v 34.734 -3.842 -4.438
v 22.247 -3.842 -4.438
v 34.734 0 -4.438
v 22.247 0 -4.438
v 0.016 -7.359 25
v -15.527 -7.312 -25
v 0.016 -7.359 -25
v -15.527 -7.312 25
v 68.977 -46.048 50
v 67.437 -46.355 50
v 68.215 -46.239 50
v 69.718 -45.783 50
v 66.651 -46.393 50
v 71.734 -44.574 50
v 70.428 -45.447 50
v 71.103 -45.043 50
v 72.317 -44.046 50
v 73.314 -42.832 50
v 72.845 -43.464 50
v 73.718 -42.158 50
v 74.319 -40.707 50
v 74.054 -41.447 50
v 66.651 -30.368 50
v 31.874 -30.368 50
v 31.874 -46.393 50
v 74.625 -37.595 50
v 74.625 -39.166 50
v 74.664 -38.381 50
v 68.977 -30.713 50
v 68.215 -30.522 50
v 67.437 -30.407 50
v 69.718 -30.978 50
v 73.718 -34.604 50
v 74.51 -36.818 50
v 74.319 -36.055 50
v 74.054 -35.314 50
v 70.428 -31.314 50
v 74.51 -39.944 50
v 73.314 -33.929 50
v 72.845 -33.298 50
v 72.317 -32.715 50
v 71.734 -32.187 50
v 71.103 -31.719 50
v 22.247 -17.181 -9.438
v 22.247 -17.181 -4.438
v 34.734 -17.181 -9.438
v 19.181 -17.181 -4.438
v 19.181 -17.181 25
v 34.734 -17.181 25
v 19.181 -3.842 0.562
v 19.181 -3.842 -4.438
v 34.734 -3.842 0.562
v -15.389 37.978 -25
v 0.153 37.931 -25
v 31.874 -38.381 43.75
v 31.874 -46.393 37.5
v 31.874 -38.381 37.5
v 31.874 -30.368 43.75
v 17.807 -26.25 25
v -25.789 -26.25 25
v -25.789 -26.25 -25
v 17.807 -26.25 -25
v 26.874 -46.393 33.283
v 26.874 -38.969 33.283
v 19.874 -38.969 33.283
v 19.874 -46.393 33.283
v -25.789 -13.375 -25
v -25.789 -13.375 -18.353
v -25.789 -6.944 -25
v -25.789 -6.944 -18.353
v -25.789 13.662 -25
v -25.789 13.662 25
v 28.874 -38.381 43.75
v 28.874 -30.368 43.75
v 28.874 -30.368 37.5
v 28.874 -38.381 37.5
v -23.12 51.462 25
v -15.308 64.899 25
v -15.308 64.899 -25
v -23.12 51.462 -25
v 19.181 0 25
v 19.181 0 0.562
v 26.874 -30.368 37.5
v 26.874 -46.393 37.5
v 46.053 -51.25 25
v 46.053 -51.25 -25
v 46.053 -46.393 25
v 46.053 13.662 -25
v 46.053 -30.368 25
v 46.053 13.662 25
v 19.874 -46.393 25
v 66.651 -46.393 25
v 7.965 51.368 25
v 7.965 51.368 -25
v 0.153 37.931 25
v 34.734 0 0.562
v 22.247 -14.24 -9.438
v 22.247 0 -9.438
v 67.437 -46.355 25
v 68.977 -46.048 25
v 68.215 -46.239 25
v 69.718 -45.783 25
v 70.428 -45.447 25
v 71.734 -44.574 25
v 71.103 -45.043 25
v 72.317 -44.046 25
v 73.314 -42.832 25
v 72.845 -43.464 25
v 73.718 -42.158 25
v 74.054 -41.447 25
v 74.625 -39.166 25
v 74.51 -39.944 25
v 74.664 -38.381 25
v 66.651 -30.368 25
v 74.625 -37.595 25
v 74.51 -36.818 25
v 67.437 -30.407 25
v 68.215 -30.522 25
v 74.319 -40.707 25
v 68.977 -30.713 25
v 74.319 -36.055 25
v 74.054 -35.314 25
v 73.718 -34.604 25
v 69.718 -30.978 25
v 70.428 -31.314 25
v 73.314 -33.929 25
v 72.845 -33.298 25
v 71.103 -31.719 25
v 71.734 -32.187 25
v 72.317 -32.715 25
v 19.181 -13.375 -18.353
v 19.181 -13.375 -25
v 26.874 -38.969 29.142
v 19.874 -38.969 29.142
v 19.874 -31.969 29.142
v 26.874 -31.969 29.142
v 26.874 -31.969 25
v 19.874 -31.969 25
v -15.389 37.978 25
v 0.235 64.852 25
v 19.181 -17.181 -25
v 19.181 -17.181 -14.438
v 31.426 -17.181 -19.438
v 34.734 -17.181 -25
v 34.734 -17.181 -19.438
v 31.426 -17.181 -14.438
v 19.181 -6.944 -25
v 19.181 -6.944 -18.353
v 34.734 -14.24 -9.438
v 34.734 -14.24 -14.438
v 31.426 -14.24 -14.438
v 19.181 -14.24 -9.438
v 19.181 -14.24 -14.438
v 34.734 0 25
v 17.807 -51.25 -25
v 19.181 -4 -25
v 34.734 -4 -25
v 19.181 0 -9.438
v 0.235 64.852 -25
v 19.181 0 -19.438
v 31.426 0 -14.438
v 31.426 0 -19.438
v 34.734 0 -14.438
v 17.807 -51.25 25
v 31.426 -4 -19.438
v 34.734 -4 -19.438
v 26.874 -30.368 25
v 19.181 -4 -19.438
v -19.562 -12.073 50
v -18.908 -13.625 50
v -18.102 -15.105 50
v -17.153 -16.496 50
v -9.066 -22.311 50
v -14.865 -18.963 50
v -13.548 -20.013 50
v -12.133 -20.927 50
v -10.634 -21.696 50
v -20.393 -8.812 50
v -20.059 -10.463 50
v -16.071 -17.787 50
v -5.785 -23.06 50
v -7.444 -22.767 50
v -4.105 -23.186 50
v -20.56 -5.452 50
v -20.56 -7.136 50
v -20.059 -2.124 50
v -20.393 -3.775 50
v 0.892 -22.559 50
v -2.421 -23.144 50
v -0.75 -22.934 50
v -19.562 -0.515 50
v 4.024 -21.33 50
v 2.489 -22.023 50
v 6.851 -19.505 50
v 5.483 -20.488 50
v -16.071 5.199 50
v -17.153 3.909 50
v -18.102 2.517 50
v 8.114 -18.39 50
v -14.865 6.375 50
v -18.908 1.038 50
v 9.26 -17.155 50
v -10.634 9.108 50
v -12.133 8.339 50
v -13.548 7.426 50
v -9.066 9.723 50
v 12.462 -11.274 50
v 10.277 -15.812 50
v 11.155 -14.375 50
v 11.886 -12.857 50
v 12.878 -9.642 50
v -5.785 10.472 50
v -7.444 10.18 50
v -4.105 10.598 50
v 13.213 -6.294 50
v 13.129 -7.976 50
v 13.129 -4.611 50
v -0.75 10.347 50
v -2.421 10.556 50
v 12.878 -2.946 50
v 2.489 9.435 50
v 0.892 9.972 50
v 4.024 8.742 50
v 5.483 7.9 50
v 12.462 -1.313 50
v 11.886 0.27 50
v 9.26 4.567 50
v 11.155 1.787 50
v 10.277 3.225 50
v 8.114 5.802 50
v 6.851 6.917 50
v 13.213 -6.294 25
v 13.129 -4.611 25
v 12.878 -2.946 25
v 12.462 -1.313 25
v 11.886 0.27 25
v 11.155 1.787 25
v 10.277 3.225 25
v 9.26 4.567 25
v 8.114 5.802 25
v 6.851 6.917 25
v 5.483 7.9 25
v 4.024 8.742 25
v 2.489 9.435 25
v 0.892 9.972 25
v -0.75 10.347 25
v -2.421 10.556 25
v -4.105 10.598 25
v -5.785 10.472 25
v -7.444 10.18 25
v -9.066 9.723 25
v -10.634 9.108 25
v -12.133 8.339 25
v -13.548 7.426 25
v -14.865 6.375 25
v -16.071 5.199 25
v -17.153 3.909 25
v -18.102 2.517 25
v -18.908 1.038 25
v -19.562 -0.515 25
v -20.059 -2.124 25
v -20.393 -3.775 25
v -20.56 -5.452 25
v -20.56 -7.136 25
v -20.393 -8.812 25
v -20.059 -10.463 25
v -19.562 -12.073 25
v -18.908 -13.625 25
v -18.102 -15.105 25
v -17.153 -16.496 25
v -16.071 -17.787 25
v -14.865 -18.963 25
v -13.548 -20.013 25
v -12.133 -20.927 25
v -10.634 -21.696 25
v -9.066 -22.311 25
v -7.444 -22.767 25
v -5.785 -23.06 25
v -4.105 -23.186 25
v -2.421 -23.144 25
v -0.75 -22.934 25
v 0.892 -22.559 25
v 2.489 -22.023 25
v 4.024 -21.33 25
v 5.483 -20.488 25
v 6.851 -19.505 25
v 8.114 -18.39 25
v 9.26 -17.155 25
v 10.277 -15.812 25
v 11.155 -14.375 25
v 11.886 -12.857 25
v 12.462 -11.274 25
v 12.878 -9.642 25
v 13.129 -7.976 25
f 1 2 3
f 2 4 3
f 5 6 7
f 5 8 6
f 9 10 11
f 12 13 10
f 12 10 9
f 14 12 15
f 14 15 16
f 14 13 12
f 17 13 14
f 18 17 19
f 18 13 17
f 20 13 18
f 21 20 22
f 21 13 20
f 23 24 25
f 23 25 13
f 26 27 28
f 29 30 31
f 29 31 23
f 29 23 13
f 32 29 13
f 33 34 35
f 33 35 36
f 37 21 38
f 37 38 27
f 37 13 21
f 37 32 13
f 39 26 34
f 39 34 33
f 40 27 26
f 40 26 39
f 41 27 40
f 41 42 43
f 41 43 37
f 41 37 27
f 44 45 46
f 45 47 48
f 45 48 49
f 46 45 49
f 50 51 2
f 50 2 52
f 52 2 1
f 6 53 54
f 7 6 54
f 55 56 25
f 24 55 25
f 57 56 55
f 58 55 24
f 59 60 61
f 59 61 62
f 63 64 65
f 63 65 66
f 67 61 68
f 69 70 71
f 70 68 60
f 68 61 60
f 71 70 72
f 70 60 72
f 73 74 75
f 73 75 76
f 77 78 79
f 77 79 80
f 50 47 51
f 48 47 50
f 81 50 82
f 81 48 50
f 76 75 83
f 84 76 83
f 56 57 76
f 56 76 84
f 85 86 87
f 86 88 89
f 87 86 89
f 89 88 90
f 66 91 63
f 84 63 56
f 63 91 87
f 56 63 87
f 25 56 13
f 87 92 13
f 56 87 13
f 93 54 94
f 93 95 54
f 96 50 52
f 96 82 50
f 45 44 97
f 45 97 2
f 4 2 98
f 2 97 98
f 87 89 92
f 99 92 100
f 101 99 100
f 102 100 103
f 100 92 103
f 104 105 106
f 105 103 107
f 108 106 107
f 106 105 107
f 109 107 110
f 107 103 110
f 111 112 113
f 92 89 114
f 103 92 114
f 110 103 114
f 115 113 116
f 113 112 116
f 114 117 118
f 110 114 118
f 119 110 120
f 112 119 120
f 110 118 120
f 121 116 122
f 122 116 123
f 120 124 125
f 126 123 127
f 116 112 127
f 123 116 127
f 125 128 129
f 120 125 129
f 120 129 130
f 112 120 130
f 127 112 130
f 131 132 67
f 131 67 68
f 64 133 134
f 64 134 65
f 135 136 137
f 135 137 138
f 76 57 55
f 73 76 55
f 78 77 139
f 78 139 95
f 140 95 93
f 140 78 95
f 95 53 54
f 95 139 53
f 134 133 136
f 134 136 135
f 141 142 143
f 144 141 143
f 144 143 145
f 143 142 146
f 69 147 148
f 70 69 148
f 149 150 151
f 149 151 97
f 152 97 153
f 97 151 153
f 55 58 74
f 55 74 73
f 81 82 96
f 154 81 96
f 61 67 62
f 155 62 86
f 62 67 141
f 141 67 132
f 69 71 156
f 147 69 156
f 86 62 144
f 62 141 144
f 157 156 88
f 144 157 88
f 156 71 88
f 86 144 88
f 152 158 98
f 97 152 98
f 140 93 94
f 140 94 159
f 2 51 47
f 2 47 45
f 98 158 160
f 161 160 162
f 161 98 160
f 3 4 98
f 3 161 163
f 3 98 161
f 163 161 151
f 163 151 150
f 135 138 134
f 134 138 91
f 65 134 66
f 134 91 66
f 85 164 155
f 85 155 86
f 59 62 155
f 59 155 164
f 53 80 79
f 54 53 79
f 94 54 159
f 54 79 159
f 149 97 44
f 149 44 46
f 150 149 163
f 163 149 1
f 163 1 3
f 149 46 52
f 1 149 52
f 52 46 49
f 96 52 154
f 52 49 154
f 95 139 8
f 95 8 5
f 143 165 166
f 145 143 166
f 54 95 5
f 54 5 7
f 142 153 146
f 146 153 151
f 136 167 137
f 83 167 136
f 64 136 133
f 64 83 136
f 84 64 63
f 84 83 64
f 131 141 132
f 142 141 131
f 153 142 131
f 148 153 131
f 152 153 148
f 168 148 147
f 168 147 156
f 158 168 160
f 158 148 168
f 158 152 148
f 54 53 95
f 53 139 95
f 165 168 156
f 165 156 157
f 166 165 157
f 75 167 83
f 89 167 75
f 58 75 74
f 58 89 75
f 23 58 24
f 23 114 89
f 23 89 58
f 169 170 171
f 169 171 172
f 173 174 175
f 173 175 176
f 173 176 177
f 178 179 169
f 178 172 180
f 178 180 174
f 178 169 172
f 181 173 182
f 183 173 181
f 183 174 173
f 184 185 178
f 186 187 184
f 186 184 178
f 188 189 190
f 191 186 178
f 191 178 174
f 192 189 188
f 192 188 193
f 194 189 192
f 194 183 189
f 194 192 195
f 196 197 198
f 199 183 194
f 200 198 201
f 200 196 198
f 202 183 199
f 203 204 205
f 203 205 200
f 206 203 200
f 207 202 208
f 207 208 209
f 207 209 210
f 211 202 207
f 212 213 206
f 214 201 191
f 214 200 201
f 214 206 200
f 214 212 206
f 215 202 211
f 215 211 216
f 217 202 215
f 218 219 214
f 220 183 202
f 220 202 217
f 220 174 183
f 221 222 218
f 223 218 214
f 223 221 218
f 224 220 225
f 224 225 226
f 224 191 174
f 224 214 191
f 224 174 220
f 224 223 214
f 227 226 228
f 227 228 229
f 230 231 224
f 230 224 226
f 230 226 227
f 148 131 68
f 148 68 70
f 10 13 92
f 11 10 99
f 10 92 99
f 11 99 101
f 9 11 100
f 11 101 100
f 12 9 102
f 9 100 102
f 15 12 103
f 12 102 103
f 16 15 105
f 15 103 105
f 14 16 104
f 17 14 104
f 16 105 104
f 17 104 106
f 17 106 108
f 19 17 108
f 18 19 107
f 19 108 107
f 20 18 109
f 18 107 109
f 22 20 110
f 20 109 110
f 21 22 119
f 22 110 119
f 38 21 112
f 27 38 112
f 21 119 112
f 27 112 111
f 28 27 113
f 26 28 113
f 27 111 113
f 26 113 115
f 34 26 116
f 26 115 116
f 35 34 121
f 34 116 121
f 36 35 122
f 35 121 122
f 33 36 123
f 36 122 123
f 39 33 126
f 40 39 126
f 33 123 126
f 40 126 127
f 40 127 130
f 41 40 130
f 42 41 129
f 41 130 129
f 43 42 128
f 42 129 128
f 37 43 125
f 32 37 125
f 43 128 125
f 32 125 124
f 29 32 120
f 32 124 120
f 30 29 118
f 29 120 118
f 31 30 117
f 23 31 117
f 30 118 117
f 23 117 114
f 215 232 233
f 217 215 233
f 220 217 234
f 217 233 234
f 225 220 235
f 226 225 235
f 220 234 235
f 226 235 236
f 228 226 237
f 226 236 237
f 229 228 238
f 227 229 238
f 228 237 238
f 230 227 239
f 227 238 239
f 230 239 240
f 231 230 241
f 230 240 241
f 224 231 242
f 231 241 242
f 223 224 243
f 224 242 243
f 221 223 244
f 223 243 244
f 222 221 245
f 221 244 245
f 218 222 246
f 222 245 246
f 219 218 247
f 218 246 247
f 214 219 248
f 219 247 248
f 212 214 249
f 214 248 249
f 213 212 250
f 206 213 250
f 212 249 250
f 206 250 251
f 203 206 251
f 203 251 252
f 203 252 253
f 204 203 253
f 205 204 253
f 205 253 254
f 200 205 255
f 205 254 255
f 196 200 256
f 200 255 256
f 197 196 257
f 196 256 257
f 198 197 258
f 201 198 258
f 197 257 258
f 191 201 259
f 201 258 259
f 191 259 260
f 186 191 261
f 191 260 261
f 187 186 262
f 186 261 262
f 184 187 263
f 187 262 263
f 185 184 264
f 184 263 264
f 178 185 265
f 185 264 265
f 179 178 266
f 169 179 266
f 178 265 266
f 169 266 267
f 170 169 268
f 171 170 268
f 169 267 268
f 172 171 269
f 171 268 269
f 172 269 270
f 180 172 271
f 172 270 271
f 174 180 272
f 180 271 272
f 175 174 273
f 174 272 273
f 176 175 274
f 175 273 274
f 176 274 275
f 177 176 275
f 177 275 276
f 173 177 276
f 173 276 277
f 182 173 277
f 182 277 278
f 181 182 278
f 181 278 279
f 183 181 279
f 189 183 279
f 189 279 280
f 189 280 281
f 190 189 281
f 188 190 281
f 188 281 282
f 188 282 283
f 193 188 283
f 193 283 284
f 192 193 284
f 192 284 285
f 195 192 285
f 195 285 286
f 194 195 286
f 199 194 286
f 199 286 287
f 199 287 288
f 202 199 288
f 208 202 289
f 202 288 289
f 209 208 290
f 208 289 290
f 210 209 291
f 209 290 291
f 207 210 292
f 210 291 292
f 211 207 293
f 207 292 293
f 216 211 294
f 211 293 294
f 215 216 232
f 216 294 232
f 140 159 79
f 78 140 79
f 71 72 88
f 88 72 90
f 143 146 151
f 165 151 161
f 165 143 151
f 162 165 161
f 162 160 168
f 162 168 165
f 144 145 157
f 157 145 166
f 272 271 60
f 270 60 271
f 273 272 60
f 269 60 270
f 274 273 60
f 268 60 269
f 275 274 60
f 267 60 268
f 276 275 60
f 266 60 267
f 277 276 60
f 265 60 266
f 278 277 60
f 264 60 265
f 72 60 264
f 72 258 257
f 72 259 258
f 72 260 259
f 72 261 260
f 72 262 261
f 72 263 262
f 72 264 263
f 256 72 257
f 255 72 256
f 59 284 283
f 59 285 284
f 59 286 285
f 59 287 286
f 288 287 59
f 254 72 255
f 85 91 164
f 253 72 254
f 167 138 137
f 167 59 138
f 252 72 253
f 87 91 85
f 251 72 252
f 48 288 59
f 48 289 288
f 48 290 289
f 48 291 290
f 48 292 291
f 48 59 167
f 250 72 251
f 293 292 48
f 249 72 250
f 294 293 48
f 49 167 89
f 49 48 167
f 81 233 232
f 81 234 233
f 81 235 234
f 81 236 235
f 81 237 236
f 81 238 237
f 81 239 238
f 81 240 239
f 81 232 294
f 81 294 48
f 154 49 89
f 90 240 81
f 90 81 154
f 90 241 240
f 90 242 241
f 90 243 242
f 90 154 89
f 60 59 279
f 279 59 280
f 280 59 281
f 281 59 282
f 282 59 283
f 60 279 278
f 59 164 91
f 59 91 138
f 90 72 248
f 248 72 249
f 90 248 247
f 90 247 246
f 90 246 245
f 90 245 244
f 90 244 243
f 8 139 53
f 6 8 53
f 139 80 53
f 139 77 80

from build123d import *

# Parameters (mm, degrees)
F0_W           = 71.8421097845
F0_H           = 39.9122815579
F1_DEPTH       = 25
F1_DEPTH_BACK  = 25
F3_W           = 28.2456167042
F3_H           = 50
F4_DEPTH       = 25
F2_W           = 15.5530497432
F2_H           = 17.180994153
F5_DEPTH       = 50.001
F6_R           = 16.8971261604
F7_DEPTH       = 25
F8_W           = 14.1789838672
F8_H           = 16.0250272602
F9_DEPTH       = 25
F10_W          = 16.0250272602
F10_H          = 12.5
F11_DEPTH      = 5
F12_W          = 7.4241384864
F12_H          = 8.2832634449
F13_DEPTH      = 7
F14_W          = 7
F14_H          = 4.1416317225
F15_DEPTH      = 7
F16_W          = 8.0125136301
F16_H          = 6.25
F17_DEPTH      = 3
F18_W          = 15.5530497432
F18_H          = 5.5617239326
F19_DEPTH      = 4
F20_W          = 3.3075883985
F20_H          = 17.482355237
F21_DEPTH      = 5
F22_W          = 12.3113431036
F22_H          = 2.9412191361
F22_W_2        = 3.3075883985
F23_DEPTH      = 5
F24_W          = 3.0662361532
F24_H          = 14.2397750169
F24_H_2        = 2.9412191361
F25_DEPTH      = 5
F26_W          = 12.6295108348
F26_H          = 3.8421889767
F26_W_2        = 3.0662361532
F27_DEPTH      = 5
F28_W          = 6.431021262
F28_H          = 6.646867469
F29_DEPTH      = 44.9710970203
F32_DEPTH      = 25
F32_DEPTH_BACK = 25
F33_DEPTH      = 45.28975


with BuildPart() as f1:
    # F0 (on Top) → F1 (new body, two sides)
    with BuildSketch(Plane.XY) as f1_sk:
        with Locations((10.1315798238, -6.2938602641)):
            Rectangle(F0_W, F0_H)
    extrude(amount=F1_DEPTH)
    extrude(f1_sk.sketch, amount=-F1_DEPTH_BACK)

    # F3 (on face) → F4 (join)
    with BuildSketch(Plane.XZ.offset(26.2500010431)):
        with Locations((31.9298263639, 0)):
            Rectangle(F3_W, F3_H)
    extrude(amount=F4_DEPTH)

    # F2 (on face) → F5 (cut, through all)
    with BuildSketch(Plane.XY.offset(25)):
        with Locations((26.9571468234, -8.5904970765)):
            Rectangle(F2_W, F2_H)
    extrude(amount=-F5_DEPTH, mode=Mode.SUBTRACT)

    # F6 (on face) → F7 (join)
    with BuildSketch(Plane.XY.offset(25)):
        with Locations((-3.6842101254, -6.2938597985)):
            Circle(F6_R)
    extrude(amount=F7_DEPTH)

    # F8 (on face) → F9 (join)
    with BuildSketch(Plane.XY.offset(25)):
        with BuildLine():
            Line((66.6513666511, -30.3681883961), (46.052634716, -30.3681883961))
            Line((46.052634716, -30.3681883961), (46.052634716, -46.3932156563))
            Line((46.052634716, -46.3932156563), (66.6513666511, -46.3932156563))
            ThreePointArc((66.6513666511, -46.3932156563), (74.6638802812, -38.3807020262), (66.6513666511, -30.3681883961))
        make_face()
        with Locations((38.9631427824, -38.3807020262)):
            Rectangle(F8_W, F8_H)
    extrude(amount=F9_DEPTH)

    # F10 (on face) → F11 (join)
    with BuildSketch(Plane(origin=(31.8736508489, 0, 0), x_dir=(0, -1, 0), z_dir=(-1, 0, 0))):
        with Locations((38.3807020262, 31.25)):
            Rectangle(F10_W, F10_H)
    extrude(amount=F11_DEPTH)

    # F12 (on face) → F13 (join)
    with BuildSketch(Plane(origin=(26.8736508489, 0, 0), x_dir=(0, -1, 0), z_dir=(-1, 0, 0))):
        with Locations((42.6811464131, 29.1416317225)):
            Rectangle(F12_W, F12_H)
    extrude(amount=F13_DEPTH)

    # F14 (on face) → F15 (join)
    with BuildSketch(Plane(origin=(0, -38.9690771699, 0), x_dir=(-1, 0, 0), z_dir=(0, 1, 0))):
        with Locations((-23.3736508489, 27.0708158612)):
            Rectangle(F14_W, F14_H)
    extrude(amount=F15_DEPTH)

    # F16 (on face) → F17 (join)
    with BuildSketch(Plane(origin=(31.8736508489, 0, 0), x_dir=(0, -1, 0), z_dir=(-1, 0, 0))):
        with Locations((34.3744452111, 40.625)):
            Rectangle(F16_W, F16_H)
    extrude(amount=F17_DEPTH)

    # F18 (on face) → F19 (join)
    with BuildSketch(Plane.XZ):
        with Locations((26.9571468234, -22.2191380337)):
            Rectangle(F18_W, F18_H)
    extrude(amount=F19_DEPTH)

    # F20 (on face) → F21 (join)
    with BuildSketch(Plane.XY.offset(-19.4382760674)):
        with Locations((33.0798774958, -8.7411776185)):
            Rectangle(F20_W, F20_H)
    extrude(amount=F21_DEPTH)

    # F22 (on face) → F23 (join)
    with BuildSketch(Plane.XY.offset(-14.4382760674)):
        with Locations((25.2704117447, -15.710384585)):
            Rectangle(F22_W, F22_H)
        with Locations((33.0798774958, -15.710384585)):
            Rectangle(F22_W_2, F22_H)
    extrude(amount=F23_DEPTH)

    # F24 (on face) → F25 (join)
    with BuildSketch(Plane.XY.offset(-9.4382760674)):
        with Locations((20.7137400284, -7.1198875085)):
            Rectangle(F24_W, F24_H)
        with Locations((20.7137400284, -15.710384585)):
            Rectangle(F24_W, F24_H_2)
    extrude(amount=F25_DEPTH)

    # F26 (on face) → F27 (join)
    with BuildSketch(Plane.XY.offset(-4.4382760674)):
        with Locations((28.5616135225, -1.9210944884)):
            Rectangle(F26_W, F26_H)
        with Locations((20.7137400284, -1.9210944884)):
            Rectangle(F26_W_2, F26_H)
    extrude(amount=F27_DEPTH)

    # F28 (on face) → F29 (cut, through all)
    with BuildSketch(Plane.YZ.offset(19.1806219518)):
        with Locations((-10.1598070469, -21.6765662655)):
            Rectangle(F28_W, F28_H)
    extrude(amount=-F29_DEPTH, mode=Mode.SUBTRACT)


with BuildPart() as f32:
    # F31 (on Top) → F32 (new body, two sides)
    with BuildSketch(Plane.XY) as f32_sk:
        Polygon((0.153236081, 37.9308532652), (7.9653235254, 51.367640895), (0.2347678149, 64.8515008933), (-15.30787534, 64.8985732618), (-23.1199627844, 51.461785632), (-15.3894070739, 37.9779256337), align=None)
    extrude(amount=F32_DEPTH)
    extrude(f32_sk.sketch, amount=-F32_DEPTH_BACK)


with BuildPart() as f33:
    # F33 (new): a face of the model
    f33_faces = [f32.part.faces().sort_by_distance(p)[0] for p in [
        (-7.6180854964, 37.9543894494, 0),
    ]]
    extrude(f33_faces, amount=F33_DEPTH)


solid = Compound([f1.part, f32.part, f33.part])
